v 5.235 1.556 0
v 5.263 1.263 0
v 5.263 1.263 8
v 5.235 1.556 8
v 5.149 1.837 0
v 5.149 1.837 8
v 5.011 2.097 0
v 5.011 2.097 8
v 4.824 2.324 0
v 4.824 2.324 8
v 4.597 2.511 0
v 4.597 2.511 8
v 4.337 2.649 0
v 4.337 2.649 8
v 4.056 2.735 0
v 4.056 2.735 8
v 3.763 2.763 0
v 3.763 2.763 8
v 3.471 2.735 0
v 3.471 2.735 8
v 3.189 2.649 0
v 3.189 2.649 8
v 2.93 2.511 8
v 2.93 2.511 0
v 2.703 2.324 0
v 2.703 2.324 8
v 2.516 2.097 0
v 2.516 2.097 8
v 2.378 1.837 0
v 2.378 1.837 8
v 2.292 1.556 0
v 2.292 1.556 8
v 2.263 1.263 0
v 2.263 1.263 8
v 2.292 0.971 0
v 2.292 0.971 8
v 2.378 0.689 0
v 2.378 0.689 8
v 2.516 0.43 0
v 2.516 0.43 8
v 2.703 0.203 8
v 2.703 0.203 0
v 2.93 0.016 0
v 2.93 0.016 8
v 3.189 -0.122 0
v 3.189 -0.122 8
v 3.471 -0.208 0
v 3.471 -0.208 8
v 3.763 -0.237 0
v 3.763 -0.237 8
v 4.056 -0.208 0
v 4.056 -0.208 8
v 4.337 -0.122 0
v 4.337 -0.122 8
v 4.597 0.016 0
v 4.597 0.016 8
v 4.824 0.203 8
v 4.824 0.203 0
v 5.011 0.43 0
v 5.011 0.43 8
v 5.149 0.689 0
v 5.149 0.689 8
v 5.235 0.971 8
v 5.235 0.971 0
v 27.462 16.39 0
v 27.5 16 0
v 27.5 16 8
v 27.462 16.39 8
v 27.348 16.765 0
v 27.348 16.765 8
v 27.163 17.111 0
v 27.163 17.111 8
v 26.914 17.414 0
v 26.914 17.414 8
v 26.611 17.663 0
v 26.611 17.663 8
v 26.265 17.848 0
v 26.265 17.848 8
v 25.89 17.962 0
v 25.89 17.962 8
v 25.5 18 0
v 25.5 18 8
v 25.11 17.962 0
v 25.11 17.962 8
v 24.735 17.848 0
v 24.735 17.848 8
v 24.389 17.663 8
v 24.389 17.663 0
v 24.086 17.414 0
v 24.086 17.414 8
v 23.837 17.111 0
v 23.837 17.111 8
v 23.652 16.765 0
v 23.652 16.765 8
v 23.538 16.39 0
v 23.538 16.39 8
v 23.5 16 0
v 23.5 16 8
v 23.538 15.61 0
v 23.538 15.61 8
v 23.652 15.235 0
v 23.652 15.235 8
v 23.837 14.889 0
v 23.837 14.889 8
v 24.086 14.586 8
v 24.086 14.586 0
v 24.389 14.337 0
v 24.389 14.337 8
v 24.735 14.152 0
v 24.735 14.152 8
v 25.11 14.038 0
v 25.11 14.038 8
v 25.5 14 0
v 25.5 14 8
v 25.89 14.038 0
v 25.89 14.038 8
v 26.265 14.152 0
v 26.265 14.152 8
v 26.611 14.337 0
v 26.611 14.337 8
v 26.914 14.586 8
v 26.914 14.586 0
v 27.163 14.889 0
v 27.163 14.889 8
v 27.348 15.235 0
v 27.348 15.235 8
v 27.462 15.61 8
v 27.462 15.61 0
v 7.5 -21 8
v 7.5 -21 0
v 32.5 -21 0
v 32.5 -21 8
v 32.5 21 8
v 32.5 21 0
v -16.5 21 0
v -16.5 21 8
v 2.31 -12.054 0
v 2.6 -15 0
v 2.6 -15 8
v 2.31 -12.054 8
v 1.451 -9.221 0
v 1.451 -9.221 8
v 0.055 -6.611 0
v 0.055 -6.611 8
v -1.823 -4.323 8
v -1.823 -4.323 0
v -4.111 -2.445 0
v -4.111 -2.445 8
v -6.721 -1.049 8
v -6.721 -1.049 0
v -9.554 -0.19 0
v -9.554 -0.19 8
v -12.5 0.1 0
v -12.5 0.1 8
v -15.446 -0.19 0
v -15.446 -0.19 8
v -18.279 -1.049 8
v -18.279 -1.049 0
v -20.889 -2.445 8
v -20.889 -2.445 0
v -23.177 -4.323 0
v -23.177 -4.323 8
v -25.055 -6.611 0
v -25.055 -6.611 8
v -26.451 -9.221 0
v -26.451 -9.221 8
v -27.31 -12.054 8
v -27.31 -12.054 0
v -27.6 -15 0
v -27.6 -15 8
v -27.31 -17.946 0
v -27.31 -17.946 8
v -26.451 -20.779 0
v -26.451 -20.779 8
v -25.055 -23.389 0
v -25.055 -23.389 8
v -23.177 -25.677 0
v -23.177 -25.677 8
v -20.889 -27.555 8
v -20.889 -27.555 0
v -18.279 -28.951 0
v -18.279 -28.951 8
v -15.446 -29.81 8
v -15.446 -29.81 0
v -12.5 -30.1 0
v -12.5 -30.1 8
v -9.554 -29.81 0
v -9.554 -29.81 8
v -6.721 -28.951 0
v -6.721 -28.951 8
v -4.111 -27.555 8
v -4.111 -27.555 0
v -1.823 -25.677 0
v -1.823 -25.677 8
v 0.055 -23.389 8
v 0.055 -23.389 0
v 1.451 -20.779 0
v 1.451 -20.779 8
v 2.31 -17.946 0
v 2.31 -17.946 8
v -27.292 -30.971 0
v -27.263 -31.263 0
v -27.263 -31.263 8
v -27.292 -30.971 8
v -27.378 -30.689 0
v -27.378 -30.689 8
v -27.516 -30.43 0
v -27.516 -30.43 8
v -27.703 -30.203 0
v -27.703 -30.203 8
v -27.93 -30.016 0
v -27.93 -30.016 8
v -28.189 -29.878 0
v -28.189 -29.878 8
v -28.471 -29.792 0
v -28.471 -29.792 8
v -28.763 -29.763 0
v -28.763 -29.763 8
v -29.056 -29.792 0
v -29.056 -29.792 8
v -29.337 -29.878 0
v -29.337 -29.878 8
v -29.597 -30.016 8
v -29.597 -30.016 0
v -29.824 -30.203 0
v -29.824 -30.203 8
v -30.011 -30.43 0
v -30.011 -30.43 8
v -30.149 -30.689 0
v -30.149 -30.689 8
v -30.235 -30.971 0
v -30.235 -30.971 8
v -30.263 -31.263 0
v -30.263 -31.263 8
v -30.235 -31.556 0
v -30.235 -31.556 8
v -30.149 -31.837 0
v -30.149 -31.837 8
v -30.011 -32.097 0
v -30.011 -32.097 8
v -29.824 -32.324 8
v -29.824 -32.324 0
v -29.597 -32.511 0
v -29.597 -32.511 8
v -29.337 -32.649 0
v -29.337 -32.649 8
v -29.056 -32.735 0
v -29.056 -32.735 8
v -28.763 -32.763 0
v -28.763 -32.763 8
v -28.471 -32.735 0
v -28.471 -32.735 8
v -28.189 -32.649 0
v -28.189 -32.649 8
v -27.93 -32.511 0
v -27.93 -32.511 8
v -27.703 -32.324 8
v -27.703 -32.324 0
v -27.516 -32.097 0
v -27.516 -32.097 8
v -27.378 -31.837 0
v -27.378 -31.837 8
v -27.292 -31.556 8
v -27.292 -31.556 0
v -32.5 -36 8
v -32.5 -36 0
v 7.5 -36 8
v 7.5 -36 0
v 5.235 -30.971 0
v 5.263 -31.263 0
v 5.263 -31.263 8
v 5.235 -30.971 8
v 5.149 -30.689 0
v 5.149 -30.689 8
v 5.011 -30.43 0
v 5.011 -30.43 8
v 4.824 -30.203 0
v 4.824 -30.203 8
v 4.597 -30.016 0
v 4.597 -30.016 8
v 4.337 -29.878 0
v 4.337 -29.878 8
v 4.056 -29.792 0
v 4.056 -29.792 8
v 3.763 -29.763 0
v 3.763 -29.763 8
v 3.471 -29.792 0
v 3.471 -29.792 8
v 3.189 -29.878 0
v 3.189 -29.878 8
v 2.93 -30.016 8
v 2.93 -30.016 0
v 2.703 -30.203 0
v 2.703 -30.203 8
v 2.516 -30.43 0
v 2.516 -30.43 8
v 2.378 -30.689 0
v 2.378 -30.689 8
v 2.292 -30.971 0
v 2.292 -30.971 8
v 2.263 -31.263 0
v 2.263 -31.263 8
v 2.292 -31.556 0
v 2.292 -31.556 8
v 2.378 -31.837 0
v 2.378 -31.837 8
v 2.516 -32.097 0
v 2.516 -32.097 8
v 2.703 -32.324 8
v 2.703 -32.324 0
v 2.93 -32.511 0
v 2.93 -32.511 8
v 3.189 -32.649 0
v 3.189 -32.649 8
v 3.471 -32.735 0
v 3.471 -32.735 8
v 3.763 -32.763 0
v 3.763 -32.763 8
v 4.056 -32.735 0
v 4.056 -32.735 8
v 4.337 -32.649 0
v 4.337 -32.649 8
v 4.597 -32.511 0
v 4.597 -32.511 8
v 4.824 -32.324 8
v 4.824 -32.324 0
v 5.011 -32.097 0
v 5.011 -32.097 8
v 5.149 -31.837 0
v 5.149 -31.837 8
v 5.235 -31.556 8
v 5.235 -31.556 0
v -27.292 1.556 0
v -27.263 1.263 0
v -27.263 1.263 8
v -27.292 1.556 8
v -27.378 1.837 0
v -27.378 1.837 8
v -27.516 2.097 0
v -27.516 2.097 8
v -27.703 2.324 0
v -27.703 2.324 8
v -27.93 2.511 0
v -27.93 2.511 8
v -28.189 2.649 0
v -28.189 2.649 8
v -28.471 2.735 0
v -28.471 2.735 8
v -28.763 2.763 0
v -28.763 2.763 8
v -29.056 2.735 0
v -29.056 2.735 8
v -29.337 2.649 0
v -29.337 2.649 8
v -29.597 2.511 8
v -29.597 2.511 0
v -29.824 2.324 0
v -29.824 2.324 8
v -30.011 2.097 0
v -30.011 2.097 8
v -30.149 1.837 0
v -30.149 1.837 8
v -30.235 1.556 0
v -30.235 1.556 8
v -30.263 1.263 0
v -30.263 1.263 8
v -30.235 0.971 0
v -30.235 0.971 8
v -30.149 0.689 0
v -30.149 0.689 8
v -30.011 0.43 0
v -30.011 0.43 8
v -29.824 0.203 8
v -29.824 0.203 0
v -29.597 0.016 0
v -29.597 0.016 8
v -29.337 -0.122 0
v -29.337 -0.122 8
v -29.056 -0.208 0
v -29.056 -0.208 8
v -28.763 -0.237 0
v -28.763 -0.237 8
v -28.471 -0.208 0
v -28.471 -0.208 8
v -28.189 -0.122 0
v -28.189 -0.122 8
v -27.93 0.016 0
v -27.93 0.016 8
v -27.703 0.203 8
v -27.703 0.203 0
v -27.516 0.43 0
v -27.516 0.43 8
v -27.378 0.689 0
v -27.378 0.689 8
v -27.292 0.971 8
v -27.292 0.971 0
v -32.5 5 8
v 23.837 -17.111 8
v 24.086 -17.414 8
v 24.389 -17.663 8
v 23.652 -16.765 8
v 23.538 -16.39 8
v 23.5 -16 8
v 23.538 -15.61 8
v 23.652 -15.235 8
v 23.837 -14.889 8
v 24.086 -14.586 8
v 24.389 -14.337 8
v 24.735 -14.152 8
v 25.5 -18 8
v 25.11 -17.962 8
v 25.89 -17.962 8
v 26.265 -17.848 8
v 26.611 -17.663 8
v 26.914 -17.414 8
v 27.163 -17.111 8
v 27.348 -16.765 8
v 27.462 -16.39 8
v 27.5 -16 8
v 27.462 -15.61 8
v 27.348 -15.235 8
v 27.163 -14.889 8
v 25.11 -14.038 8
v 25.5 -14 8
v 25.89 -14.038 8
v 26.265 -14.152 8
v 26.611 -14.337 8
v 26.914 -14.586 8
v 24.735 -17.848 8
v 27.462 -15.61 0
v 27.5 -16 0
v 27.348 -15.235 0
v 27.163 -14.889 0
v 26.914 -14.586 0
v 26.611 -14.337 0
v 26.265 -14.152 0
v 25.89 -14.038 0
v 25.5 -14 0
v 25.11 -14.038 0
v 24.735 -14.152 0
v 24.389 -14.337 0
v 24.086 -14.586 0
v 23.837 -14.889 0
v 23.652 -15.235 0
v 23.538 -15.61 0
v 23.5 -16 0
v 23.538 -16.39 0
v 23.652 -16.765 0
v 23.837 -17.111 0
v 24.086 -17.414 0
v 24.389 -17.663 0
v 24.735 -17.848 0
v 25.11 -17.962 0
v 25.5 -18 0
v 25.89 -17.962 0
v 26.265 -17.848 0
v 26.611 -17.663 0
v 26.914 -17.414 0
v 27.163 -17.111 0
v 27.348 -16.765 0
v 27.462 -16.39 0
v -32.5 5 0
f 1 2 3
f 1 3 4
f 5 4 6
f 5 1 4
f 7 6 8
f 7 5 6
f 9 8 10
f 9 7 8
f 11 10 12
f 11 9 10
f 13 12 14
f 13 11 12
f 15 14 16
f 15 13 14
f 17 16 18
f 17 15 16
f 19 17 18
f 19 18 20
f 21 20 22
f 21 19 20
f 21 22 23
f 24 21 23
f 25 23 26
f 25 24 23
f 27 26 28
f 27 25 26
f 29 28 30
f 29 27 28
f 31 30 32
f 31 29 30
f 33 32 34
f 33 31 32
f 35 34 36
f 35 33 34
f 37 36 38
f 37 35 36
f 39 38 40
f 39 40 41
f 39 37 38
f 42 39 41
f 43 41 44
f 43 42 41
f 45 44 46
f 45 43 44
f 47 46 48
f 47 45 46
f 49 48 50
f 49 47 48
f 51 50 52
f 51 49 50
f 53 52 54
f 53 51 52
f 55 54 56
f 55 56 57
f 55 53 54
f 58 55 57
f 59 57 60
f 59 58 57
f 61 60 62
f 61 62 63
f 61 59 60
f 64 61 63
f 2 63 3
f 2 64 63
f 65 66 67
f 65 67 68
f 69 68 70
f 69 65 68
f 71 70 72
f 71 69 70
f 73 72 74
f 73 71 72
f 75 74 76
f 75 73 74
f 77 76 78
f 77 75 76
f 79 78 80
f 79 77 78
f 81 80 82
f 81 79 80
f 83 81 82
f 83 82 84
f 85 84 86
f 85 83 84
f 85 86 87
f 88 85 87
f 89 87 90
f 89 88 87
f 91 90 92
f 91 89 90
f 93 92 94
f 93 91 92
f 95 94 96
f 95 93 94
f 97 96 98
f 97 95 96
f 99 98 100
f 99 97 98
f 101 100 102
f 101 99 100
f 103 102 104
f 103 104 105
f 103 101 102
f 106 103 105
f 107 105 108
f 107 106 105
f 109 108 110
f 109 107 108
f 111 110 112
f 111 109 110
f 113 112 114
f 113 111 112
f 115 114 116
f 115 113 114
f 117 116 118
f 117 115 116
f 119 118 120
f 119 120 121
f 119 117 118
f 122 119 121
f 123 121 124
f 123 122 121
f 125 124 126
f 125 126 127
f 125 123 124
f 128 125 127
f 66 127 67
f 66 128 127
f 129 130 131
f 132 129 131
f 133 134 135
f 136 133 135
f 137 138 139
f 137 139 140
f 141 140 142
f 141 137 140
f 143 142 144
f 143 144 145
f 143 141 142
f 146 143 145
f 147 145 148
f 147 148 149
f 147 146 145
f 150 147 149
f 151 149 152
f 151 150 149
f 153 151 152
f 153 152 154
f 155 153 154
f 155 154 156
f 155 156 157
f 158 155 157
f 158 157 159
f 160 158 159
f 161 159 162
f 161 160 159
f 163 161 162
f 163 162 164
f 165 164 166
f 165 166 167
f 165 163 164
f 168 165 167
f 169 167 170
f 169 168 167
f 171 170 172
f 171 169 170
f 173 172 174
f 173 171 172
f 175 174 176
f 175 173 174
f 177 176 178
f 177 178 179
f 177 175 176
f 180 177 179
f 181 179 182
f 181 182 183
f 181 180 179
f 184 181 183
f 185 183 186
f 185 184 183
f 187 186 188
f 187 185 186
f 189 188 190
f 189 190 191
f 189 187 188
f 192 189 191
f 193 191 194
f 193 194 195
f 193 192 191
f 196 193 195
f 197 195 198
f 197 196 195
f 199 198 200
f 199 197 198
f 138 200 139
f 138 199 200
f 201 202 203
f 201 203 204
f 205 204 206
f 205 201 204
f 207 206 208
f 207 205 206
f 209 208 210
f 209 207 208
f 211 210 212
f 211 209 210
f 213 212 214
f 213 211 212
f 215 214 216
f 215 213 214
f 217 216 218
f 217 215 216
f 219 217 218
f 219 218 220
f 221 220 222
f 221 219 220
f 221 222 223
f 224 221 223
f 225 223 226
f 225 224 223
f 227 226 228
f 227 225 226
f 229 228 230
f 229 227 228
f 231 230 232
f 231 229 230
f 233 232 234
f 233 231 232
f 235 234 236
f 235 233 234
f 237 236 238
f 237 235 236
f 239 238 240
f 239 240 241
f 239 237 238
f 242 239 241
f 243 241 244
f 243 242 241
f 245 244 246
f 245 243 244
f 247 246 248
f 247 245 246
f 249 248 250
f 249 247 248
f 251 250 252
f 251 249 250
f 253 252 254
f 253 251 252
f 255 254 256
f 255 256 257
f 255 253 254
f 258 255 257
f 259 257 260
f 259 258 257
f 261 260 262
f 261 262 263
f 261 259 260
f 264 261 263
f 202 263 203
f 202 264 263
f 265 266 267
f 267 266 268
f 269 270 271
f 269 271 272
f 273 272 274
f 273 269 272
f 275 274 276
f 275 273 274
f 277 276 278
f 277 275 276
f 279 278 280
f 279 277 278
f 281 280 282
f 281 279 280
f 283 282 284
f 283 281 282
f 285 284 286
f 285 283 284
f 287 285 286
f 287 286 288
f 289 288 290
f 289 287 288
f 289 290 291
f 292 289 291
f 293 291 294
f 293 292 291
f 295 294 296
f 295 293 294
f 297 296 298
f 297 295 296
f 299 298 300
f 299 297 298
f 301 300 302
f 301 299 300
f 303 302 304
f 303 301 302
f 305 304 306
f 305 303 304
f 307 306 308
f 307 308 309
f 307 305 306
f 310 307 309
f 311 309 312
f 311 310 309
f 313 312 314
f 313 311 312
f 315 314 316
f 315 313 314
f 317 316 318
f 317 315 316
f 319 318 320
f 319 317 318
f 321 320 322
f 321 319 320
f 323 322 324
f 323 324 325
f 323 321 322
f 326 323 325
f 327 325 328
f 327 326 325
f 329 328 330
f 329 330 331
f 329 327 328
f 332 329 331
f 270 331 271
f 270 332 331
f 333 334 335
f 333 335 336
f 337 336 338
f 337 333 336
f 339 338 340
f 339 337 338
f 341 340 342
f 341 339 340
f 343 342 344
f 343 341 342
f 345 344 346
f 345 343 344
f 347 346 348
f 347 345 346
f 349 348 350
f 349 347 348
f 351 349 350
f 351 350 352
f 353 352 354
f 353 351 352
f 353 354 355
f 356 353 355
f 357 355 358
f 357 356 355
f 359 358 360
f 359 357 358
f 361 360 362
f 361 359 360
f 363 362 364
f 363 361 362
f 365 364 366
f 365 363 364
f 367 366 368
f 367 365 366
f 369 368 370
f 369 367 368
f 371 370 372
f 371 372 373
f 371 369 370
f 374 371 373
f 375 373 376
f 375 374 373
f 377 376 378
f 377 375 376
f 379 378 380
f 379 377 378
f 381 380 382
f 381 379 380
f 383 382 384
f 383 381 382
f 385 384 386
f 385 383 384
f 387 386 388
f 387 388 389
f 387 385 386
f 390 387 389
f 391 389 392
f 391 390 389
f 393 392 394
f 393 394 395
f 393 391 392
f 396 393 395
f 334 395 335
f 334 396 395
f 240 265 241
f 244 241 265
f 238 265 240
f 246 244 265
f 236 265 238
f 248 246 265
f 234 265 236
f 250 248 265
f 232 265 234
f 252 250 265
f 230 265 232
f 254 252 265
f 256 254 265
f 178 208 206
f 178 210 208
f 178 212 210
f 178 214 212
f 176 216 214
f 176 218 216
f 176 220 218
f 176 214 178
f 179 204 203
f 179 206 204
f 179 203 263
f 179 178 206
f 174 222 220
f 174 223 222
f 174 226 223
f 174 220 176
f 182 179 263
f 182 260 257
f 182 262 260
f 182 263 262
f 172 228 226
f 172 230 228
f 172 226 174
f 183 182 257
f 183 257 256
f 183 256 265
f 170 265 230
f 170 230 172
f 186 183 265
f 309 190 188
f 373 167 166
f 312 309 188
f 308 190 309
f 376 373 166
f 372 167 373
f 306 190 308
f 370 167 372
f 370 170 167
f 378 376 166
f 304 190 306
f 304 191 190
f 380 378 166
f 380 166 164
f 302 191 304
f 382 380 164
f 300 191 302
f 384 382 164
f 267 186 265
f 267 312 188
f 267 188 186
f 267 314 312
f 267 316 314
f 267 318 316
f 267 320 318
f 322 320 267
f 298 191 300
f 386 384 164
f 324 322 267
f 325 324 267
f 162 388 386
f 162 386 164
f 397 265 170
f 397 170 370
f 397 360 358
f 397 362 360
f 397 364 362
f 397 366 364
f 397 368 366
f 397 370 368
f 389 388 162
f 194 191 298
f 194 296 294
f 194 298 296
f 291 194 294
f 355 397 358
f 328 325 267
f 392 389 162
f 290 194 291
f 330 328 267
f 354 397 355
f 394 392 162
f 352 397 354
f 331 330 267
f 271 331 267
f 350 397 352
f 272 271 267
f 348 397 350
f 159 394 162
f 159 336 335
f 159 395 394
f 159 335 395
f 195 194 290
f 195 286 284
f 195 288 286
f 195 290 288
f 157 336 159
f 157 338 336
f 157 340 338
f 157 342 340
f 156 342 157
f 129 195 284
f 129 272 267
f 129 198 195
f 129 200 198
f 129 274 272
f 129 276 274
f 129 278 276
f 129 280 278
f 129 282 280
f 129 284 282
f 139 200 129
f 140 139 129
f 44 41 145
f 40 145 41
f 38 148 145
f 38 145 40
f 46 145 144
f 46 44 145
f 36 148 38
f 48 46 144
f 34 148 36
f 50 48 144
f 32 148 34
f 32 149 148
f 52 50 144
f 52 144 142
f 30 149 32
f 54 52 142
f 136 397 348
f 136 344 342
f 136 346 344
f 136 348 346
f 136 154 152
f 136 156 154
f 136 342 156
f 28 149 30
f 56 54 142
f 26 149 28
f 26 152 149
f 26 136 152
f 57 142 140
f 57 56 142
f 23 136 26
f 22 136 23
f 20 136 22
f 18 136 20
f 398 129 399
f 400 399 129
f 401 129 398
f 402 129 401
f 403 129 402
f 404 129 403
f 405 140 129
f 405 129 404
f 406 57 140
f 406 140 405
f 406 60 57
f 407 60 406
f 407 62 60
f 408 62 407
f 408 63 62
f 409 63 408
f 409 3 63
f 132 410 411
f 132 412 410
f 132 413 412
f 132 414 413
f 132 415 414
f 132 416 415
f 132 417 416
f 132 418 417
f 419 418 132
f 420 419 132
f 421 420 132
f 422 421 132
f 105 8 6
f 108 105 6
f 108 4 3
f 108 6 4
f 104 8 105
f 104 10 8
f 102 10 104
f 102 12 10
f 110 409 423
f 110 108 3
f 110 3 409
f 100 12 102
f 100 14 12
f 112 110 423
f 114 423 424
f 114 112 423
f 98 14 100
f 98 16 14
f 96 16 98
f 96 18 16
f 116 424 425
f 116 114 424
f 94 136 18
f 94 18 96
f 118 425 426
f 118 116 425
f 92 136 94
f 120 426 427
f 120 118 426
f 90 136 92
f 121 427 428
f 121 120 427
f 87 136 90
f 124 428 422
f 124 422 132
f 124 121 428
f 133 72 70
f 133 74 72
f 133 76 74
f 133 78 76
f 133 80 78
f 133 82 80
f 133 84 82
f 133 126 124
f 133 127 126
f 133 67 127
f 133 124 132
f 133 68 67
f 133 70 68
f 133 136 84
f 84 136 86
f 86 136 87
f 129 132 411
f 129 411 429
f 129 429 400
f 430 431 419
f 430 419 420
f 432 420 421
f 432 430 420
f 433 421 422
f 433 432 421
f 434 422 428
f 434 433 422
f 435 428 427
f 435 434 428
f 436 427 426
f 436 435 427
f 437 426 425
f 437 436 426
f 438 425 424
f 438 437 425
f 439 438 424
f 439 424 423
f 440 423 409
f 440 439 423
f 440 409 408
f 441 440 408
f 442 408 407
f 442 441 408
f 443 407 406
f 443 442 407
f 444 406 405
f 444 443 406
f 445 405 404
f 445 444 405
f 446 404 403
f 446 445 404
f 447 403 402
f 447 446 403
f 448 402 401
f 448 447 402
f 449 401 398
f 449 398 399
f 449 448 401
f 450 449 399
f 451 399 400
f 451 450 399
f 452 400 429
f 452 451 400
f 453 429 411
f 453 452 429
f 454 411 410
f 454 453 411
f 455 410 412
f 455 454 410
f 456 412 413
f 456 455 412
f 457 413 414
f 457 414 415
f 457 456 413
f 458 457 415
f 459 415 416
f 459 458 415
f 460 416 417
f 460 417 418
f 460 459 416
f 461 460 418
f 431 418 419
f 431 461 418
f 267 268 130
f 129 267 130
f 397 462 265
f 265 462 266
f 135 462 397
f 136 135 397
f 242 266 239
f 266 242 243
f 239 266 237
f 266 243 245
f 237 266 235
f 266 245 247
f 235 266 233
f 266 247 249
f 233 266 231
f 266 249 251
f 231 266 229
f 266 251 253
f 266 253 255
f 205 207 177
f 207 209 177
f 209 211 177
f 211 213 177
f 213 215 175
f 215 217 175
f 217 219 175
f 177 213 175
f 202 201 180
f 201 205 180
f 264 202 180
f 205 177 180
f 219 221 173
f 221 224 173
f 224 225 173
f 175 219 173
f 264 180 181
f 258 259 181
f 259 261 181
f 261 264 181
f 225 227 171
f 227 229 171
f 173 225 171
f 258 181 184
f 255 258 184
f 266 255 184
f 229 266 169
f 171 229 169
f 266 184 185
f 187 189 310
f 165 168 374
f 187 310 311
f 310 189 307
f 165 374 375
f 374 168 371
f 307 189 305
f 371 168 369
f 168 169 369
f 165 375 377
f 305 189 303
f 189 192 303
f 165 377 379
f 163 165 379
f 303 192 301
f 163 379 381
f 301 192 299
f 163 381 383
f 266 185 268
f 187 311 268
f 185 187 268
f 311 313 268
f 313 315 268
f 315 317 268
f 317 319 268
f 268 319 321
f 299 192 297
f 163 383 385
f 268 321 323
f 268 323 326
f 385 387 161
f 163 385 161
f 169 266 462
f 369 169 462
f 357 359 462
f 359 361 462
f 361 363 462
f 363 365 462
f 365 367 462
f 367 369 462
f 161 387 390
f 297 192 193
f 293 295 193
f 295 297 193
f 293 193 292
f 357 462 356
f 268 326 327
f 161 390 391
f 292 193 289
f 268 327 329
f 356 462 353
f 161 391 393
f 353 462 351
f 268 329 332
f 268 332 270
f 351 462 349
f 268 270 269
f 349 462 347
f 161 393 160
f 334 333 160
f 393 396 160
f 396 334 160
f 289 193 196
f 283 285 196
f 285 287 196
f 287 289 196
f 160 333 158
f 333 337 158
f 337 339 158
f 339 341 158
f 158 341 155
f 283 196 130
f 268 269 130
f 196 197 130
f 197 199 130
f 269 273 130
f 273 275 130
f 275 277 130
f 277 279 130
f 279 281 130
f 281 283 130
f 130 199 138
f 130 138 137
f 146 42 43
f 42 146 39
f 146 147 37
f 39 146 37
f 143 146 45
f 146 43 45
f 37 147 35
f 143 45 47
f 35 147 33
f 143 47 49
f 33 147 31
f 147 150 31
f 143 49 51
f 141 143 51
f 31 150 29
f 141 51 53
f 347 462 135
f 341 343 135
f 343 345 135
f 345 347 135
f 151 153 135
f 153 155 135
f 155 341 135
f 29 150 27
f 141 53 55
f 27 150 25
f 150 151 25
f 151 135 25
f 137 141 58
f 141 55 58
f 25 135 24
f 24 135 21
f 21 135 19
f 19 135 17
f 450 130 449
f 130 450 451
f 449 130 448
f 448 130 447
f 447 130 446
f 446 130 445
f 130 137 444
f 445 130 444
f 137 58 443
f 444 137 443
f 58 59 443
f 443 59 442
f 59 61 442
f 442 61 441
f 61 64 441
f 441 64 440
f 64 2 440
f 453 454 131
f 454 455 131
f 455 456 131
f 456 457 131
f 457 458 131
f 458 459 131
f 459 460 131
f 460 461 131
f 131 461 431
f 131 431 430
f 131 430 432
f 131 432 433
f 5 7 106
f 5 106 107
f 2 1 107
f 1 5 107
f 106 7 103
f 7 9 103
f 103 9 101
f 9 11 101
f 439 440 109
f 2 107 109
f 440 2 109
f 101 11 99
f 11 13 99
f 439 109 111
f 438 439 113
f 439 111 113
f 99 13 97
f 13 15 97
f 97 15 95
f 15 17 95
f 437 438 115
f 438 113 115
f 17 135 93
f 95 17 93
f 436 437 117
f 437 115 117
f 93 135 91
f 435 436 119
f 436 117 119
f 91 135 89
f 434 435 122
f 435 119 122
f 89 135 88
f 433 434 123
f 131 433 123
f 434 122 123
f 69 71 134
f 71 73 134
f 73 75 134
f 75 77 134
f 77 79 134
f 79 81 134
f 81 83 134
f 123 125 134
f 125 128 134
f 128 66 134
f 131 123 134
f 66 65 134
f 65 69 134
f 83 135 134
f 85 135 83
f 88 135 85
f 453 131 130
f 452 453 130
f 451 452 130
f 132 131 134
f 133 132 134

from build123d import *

# Parameters (mm, degrees)
F0_R     = 1.5
F0_R_2   = 15.1
F0_R_3   = 2
F1_DEPTH = 8
F2_SIZE  = 16


with BuildPart() as f1:
    # F0 (on Top) → F1 (new body)
    with BuildSketch(Plane.XY):
        Polygon((32.5, -21), (32.5, 21), (-32.5, 21), (-32.5, -21), (-32.5, -36), (7.5, -36), (7.5, -21), align=None)
        with Locations((-28.763456, -31.263456)):
            Circle(F0_R, mode=Mode.SUBTRACT)
        with Locations((-12.5, -15)):
            Circle(F0_R_2, mode=Mode.SUBTRACT)
        with Locations((3.763456, -31.263456)):
            Circle(F0_R, mode=Mode.SUBTRACT)
        with Locations((25.5, -16)):
            Circle(F0_R_3, mode=Mode.SUBTRACT)
        with Locations((-28.763456, 1.263456)):
            Circle(F0_R, mode=Mode.SUBTRACT)
        with Locations((3.763456, 1.263456)):
            Circle(F0_R, mode=Mode.SUBTRACT)
        with Locations((25.5, 16)):
            Circle(F0_R_3, mode=Mode.SUBTRACT)
    extrude(amount=F1_DEPTH)

    # F2
    f2_edges = [f1.edges().sort_by_distance(p)[0] for p in [
        (-32.5, 21, 4),
    ]]
    chamfer(f2_edges, length=F2_SIZE)


solid = f1.part
